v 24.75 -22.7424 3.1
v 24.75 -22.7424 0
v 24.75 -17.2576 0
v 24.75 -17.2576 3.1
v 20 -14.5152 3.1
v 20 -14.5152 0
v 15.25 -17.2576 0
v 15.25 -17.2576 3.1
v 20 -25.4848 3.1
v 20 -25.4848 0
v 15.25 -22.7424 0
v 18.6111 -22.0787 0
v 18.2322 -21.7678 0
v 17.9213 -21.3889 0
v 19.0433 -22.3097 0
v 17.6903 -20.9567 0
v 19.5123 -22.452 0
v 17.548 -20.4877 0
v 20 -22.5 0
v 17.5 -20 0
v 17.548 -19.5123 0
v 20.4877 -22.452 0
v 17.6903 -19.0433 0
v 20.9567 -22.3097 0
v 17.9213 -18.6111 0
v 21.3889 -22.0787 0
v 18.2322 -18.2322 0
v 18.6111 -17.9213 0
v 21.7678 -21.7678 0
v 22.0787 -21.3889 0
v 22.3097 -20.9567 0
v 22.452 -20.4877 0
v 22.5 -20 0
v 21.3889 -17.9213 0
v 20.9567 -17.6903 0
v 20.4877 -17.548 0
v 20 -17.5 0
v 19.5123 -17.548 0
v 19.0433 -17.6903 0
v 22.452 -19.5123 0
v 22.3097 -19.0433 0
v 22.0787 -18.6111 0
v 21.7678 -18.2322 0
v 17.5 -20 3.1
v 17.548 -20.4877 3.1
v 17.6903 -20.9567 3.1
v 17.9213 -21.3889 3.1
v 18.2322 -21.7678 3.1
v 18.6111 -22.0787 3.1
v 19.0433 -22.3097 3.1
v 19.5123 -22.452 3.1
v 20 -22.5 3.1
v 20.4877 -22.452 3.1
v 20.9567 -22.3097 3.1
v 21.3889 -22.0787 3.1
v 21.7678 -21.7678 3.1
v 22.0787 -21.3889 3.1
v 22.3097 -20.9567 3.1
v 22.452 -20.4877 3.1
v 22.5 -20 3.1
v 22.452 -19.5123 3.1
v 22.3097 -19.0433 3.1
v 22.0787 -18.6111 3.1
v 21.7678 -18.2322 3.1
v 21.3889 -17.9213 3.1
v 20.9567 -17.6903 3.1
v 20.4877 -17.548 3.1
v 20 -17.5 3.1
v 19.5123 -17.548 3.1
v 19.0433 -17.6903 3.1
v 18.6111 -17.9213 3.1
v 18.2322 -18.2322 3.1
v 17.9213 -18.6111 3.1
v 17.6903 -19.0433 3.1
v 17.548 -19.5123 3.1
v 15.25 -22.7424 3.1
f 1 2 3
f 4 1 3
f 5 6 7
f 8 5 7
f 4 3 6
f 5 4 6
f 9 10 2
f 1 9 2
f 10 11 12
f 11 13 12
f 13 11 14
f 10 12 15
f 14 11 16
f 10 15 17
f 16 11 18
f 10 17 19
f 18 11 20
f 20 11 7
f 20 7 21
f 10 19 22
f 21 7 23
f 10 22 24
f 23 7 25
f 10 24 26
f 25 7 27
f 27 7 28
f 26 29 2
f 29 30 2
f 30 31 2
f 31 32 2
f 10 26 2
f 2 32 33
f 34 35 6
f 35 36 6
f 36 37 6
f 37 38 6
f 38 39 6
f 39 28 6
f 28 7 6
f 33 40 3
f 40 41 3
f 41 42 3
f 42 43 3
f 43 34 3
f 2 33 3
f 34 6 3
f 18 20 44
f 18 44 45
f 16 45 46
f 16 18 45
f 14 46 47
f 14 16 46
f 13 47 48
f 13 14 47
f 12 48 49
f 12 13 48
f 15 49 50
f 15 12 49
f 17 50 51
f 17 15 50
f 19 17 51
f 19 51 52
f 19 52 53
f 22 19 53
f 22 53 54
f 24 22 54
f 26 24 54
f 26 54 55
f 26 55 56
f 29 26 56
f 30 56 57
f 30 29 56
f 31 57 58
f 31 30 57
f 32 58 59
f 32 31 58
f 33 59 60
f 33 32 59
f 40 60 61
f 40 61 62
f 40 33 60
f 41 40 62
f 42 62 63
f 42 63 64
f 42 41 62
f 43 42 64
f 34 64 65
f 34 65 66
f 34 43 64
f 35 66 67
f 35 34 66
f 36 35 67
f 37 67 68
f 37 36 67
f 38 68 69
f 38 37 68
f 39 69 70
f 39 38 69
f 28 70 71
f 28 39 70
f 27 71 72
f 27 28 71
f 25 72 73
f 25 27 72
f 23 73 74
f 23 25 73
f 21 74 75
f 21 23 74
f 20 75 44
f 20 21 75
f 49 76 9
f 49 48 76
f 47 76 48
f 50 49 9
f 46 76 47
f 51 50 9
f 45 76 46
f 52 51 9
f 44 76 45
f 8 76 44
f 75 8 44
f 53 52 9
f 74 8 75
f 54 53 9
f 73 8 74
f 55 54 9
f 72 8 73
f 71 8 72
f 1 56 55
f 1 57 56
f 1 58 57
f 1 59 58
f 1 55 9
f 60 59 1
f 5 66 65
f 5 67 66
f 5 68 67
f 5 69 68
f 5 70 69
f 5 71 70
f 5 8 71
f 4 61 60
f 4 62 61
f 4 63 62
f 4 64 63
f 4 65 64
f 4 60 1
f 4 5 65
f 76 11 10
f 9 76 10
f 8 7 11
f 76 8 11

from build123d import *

# Parameters (mm, degrees)
SKETCH1_R           = 2.5
BOSS_EXTRUDE1_DEPTH = 3.1


with BuildPart() as part:
    # Sketch1 → Boss-Extrude1 (new body)
    with BuildSketch(Plane.XY):
        Polygon((20, -25.484827557), (24.75, -22.742413779), (24.75, -17.257586221), (20, -14.515172443), (15.25, -17.257586221), (15.25, -22.742413779), align=None)
        with Locations(Location((20, -20, 0), (0, 0, 180))):
            Circle(SKETCH1_R, mode=Mode.SUBTRACT)
    extrude(amount=BOSS_EXTRUDE1_DEPTH)


solid = part.part
